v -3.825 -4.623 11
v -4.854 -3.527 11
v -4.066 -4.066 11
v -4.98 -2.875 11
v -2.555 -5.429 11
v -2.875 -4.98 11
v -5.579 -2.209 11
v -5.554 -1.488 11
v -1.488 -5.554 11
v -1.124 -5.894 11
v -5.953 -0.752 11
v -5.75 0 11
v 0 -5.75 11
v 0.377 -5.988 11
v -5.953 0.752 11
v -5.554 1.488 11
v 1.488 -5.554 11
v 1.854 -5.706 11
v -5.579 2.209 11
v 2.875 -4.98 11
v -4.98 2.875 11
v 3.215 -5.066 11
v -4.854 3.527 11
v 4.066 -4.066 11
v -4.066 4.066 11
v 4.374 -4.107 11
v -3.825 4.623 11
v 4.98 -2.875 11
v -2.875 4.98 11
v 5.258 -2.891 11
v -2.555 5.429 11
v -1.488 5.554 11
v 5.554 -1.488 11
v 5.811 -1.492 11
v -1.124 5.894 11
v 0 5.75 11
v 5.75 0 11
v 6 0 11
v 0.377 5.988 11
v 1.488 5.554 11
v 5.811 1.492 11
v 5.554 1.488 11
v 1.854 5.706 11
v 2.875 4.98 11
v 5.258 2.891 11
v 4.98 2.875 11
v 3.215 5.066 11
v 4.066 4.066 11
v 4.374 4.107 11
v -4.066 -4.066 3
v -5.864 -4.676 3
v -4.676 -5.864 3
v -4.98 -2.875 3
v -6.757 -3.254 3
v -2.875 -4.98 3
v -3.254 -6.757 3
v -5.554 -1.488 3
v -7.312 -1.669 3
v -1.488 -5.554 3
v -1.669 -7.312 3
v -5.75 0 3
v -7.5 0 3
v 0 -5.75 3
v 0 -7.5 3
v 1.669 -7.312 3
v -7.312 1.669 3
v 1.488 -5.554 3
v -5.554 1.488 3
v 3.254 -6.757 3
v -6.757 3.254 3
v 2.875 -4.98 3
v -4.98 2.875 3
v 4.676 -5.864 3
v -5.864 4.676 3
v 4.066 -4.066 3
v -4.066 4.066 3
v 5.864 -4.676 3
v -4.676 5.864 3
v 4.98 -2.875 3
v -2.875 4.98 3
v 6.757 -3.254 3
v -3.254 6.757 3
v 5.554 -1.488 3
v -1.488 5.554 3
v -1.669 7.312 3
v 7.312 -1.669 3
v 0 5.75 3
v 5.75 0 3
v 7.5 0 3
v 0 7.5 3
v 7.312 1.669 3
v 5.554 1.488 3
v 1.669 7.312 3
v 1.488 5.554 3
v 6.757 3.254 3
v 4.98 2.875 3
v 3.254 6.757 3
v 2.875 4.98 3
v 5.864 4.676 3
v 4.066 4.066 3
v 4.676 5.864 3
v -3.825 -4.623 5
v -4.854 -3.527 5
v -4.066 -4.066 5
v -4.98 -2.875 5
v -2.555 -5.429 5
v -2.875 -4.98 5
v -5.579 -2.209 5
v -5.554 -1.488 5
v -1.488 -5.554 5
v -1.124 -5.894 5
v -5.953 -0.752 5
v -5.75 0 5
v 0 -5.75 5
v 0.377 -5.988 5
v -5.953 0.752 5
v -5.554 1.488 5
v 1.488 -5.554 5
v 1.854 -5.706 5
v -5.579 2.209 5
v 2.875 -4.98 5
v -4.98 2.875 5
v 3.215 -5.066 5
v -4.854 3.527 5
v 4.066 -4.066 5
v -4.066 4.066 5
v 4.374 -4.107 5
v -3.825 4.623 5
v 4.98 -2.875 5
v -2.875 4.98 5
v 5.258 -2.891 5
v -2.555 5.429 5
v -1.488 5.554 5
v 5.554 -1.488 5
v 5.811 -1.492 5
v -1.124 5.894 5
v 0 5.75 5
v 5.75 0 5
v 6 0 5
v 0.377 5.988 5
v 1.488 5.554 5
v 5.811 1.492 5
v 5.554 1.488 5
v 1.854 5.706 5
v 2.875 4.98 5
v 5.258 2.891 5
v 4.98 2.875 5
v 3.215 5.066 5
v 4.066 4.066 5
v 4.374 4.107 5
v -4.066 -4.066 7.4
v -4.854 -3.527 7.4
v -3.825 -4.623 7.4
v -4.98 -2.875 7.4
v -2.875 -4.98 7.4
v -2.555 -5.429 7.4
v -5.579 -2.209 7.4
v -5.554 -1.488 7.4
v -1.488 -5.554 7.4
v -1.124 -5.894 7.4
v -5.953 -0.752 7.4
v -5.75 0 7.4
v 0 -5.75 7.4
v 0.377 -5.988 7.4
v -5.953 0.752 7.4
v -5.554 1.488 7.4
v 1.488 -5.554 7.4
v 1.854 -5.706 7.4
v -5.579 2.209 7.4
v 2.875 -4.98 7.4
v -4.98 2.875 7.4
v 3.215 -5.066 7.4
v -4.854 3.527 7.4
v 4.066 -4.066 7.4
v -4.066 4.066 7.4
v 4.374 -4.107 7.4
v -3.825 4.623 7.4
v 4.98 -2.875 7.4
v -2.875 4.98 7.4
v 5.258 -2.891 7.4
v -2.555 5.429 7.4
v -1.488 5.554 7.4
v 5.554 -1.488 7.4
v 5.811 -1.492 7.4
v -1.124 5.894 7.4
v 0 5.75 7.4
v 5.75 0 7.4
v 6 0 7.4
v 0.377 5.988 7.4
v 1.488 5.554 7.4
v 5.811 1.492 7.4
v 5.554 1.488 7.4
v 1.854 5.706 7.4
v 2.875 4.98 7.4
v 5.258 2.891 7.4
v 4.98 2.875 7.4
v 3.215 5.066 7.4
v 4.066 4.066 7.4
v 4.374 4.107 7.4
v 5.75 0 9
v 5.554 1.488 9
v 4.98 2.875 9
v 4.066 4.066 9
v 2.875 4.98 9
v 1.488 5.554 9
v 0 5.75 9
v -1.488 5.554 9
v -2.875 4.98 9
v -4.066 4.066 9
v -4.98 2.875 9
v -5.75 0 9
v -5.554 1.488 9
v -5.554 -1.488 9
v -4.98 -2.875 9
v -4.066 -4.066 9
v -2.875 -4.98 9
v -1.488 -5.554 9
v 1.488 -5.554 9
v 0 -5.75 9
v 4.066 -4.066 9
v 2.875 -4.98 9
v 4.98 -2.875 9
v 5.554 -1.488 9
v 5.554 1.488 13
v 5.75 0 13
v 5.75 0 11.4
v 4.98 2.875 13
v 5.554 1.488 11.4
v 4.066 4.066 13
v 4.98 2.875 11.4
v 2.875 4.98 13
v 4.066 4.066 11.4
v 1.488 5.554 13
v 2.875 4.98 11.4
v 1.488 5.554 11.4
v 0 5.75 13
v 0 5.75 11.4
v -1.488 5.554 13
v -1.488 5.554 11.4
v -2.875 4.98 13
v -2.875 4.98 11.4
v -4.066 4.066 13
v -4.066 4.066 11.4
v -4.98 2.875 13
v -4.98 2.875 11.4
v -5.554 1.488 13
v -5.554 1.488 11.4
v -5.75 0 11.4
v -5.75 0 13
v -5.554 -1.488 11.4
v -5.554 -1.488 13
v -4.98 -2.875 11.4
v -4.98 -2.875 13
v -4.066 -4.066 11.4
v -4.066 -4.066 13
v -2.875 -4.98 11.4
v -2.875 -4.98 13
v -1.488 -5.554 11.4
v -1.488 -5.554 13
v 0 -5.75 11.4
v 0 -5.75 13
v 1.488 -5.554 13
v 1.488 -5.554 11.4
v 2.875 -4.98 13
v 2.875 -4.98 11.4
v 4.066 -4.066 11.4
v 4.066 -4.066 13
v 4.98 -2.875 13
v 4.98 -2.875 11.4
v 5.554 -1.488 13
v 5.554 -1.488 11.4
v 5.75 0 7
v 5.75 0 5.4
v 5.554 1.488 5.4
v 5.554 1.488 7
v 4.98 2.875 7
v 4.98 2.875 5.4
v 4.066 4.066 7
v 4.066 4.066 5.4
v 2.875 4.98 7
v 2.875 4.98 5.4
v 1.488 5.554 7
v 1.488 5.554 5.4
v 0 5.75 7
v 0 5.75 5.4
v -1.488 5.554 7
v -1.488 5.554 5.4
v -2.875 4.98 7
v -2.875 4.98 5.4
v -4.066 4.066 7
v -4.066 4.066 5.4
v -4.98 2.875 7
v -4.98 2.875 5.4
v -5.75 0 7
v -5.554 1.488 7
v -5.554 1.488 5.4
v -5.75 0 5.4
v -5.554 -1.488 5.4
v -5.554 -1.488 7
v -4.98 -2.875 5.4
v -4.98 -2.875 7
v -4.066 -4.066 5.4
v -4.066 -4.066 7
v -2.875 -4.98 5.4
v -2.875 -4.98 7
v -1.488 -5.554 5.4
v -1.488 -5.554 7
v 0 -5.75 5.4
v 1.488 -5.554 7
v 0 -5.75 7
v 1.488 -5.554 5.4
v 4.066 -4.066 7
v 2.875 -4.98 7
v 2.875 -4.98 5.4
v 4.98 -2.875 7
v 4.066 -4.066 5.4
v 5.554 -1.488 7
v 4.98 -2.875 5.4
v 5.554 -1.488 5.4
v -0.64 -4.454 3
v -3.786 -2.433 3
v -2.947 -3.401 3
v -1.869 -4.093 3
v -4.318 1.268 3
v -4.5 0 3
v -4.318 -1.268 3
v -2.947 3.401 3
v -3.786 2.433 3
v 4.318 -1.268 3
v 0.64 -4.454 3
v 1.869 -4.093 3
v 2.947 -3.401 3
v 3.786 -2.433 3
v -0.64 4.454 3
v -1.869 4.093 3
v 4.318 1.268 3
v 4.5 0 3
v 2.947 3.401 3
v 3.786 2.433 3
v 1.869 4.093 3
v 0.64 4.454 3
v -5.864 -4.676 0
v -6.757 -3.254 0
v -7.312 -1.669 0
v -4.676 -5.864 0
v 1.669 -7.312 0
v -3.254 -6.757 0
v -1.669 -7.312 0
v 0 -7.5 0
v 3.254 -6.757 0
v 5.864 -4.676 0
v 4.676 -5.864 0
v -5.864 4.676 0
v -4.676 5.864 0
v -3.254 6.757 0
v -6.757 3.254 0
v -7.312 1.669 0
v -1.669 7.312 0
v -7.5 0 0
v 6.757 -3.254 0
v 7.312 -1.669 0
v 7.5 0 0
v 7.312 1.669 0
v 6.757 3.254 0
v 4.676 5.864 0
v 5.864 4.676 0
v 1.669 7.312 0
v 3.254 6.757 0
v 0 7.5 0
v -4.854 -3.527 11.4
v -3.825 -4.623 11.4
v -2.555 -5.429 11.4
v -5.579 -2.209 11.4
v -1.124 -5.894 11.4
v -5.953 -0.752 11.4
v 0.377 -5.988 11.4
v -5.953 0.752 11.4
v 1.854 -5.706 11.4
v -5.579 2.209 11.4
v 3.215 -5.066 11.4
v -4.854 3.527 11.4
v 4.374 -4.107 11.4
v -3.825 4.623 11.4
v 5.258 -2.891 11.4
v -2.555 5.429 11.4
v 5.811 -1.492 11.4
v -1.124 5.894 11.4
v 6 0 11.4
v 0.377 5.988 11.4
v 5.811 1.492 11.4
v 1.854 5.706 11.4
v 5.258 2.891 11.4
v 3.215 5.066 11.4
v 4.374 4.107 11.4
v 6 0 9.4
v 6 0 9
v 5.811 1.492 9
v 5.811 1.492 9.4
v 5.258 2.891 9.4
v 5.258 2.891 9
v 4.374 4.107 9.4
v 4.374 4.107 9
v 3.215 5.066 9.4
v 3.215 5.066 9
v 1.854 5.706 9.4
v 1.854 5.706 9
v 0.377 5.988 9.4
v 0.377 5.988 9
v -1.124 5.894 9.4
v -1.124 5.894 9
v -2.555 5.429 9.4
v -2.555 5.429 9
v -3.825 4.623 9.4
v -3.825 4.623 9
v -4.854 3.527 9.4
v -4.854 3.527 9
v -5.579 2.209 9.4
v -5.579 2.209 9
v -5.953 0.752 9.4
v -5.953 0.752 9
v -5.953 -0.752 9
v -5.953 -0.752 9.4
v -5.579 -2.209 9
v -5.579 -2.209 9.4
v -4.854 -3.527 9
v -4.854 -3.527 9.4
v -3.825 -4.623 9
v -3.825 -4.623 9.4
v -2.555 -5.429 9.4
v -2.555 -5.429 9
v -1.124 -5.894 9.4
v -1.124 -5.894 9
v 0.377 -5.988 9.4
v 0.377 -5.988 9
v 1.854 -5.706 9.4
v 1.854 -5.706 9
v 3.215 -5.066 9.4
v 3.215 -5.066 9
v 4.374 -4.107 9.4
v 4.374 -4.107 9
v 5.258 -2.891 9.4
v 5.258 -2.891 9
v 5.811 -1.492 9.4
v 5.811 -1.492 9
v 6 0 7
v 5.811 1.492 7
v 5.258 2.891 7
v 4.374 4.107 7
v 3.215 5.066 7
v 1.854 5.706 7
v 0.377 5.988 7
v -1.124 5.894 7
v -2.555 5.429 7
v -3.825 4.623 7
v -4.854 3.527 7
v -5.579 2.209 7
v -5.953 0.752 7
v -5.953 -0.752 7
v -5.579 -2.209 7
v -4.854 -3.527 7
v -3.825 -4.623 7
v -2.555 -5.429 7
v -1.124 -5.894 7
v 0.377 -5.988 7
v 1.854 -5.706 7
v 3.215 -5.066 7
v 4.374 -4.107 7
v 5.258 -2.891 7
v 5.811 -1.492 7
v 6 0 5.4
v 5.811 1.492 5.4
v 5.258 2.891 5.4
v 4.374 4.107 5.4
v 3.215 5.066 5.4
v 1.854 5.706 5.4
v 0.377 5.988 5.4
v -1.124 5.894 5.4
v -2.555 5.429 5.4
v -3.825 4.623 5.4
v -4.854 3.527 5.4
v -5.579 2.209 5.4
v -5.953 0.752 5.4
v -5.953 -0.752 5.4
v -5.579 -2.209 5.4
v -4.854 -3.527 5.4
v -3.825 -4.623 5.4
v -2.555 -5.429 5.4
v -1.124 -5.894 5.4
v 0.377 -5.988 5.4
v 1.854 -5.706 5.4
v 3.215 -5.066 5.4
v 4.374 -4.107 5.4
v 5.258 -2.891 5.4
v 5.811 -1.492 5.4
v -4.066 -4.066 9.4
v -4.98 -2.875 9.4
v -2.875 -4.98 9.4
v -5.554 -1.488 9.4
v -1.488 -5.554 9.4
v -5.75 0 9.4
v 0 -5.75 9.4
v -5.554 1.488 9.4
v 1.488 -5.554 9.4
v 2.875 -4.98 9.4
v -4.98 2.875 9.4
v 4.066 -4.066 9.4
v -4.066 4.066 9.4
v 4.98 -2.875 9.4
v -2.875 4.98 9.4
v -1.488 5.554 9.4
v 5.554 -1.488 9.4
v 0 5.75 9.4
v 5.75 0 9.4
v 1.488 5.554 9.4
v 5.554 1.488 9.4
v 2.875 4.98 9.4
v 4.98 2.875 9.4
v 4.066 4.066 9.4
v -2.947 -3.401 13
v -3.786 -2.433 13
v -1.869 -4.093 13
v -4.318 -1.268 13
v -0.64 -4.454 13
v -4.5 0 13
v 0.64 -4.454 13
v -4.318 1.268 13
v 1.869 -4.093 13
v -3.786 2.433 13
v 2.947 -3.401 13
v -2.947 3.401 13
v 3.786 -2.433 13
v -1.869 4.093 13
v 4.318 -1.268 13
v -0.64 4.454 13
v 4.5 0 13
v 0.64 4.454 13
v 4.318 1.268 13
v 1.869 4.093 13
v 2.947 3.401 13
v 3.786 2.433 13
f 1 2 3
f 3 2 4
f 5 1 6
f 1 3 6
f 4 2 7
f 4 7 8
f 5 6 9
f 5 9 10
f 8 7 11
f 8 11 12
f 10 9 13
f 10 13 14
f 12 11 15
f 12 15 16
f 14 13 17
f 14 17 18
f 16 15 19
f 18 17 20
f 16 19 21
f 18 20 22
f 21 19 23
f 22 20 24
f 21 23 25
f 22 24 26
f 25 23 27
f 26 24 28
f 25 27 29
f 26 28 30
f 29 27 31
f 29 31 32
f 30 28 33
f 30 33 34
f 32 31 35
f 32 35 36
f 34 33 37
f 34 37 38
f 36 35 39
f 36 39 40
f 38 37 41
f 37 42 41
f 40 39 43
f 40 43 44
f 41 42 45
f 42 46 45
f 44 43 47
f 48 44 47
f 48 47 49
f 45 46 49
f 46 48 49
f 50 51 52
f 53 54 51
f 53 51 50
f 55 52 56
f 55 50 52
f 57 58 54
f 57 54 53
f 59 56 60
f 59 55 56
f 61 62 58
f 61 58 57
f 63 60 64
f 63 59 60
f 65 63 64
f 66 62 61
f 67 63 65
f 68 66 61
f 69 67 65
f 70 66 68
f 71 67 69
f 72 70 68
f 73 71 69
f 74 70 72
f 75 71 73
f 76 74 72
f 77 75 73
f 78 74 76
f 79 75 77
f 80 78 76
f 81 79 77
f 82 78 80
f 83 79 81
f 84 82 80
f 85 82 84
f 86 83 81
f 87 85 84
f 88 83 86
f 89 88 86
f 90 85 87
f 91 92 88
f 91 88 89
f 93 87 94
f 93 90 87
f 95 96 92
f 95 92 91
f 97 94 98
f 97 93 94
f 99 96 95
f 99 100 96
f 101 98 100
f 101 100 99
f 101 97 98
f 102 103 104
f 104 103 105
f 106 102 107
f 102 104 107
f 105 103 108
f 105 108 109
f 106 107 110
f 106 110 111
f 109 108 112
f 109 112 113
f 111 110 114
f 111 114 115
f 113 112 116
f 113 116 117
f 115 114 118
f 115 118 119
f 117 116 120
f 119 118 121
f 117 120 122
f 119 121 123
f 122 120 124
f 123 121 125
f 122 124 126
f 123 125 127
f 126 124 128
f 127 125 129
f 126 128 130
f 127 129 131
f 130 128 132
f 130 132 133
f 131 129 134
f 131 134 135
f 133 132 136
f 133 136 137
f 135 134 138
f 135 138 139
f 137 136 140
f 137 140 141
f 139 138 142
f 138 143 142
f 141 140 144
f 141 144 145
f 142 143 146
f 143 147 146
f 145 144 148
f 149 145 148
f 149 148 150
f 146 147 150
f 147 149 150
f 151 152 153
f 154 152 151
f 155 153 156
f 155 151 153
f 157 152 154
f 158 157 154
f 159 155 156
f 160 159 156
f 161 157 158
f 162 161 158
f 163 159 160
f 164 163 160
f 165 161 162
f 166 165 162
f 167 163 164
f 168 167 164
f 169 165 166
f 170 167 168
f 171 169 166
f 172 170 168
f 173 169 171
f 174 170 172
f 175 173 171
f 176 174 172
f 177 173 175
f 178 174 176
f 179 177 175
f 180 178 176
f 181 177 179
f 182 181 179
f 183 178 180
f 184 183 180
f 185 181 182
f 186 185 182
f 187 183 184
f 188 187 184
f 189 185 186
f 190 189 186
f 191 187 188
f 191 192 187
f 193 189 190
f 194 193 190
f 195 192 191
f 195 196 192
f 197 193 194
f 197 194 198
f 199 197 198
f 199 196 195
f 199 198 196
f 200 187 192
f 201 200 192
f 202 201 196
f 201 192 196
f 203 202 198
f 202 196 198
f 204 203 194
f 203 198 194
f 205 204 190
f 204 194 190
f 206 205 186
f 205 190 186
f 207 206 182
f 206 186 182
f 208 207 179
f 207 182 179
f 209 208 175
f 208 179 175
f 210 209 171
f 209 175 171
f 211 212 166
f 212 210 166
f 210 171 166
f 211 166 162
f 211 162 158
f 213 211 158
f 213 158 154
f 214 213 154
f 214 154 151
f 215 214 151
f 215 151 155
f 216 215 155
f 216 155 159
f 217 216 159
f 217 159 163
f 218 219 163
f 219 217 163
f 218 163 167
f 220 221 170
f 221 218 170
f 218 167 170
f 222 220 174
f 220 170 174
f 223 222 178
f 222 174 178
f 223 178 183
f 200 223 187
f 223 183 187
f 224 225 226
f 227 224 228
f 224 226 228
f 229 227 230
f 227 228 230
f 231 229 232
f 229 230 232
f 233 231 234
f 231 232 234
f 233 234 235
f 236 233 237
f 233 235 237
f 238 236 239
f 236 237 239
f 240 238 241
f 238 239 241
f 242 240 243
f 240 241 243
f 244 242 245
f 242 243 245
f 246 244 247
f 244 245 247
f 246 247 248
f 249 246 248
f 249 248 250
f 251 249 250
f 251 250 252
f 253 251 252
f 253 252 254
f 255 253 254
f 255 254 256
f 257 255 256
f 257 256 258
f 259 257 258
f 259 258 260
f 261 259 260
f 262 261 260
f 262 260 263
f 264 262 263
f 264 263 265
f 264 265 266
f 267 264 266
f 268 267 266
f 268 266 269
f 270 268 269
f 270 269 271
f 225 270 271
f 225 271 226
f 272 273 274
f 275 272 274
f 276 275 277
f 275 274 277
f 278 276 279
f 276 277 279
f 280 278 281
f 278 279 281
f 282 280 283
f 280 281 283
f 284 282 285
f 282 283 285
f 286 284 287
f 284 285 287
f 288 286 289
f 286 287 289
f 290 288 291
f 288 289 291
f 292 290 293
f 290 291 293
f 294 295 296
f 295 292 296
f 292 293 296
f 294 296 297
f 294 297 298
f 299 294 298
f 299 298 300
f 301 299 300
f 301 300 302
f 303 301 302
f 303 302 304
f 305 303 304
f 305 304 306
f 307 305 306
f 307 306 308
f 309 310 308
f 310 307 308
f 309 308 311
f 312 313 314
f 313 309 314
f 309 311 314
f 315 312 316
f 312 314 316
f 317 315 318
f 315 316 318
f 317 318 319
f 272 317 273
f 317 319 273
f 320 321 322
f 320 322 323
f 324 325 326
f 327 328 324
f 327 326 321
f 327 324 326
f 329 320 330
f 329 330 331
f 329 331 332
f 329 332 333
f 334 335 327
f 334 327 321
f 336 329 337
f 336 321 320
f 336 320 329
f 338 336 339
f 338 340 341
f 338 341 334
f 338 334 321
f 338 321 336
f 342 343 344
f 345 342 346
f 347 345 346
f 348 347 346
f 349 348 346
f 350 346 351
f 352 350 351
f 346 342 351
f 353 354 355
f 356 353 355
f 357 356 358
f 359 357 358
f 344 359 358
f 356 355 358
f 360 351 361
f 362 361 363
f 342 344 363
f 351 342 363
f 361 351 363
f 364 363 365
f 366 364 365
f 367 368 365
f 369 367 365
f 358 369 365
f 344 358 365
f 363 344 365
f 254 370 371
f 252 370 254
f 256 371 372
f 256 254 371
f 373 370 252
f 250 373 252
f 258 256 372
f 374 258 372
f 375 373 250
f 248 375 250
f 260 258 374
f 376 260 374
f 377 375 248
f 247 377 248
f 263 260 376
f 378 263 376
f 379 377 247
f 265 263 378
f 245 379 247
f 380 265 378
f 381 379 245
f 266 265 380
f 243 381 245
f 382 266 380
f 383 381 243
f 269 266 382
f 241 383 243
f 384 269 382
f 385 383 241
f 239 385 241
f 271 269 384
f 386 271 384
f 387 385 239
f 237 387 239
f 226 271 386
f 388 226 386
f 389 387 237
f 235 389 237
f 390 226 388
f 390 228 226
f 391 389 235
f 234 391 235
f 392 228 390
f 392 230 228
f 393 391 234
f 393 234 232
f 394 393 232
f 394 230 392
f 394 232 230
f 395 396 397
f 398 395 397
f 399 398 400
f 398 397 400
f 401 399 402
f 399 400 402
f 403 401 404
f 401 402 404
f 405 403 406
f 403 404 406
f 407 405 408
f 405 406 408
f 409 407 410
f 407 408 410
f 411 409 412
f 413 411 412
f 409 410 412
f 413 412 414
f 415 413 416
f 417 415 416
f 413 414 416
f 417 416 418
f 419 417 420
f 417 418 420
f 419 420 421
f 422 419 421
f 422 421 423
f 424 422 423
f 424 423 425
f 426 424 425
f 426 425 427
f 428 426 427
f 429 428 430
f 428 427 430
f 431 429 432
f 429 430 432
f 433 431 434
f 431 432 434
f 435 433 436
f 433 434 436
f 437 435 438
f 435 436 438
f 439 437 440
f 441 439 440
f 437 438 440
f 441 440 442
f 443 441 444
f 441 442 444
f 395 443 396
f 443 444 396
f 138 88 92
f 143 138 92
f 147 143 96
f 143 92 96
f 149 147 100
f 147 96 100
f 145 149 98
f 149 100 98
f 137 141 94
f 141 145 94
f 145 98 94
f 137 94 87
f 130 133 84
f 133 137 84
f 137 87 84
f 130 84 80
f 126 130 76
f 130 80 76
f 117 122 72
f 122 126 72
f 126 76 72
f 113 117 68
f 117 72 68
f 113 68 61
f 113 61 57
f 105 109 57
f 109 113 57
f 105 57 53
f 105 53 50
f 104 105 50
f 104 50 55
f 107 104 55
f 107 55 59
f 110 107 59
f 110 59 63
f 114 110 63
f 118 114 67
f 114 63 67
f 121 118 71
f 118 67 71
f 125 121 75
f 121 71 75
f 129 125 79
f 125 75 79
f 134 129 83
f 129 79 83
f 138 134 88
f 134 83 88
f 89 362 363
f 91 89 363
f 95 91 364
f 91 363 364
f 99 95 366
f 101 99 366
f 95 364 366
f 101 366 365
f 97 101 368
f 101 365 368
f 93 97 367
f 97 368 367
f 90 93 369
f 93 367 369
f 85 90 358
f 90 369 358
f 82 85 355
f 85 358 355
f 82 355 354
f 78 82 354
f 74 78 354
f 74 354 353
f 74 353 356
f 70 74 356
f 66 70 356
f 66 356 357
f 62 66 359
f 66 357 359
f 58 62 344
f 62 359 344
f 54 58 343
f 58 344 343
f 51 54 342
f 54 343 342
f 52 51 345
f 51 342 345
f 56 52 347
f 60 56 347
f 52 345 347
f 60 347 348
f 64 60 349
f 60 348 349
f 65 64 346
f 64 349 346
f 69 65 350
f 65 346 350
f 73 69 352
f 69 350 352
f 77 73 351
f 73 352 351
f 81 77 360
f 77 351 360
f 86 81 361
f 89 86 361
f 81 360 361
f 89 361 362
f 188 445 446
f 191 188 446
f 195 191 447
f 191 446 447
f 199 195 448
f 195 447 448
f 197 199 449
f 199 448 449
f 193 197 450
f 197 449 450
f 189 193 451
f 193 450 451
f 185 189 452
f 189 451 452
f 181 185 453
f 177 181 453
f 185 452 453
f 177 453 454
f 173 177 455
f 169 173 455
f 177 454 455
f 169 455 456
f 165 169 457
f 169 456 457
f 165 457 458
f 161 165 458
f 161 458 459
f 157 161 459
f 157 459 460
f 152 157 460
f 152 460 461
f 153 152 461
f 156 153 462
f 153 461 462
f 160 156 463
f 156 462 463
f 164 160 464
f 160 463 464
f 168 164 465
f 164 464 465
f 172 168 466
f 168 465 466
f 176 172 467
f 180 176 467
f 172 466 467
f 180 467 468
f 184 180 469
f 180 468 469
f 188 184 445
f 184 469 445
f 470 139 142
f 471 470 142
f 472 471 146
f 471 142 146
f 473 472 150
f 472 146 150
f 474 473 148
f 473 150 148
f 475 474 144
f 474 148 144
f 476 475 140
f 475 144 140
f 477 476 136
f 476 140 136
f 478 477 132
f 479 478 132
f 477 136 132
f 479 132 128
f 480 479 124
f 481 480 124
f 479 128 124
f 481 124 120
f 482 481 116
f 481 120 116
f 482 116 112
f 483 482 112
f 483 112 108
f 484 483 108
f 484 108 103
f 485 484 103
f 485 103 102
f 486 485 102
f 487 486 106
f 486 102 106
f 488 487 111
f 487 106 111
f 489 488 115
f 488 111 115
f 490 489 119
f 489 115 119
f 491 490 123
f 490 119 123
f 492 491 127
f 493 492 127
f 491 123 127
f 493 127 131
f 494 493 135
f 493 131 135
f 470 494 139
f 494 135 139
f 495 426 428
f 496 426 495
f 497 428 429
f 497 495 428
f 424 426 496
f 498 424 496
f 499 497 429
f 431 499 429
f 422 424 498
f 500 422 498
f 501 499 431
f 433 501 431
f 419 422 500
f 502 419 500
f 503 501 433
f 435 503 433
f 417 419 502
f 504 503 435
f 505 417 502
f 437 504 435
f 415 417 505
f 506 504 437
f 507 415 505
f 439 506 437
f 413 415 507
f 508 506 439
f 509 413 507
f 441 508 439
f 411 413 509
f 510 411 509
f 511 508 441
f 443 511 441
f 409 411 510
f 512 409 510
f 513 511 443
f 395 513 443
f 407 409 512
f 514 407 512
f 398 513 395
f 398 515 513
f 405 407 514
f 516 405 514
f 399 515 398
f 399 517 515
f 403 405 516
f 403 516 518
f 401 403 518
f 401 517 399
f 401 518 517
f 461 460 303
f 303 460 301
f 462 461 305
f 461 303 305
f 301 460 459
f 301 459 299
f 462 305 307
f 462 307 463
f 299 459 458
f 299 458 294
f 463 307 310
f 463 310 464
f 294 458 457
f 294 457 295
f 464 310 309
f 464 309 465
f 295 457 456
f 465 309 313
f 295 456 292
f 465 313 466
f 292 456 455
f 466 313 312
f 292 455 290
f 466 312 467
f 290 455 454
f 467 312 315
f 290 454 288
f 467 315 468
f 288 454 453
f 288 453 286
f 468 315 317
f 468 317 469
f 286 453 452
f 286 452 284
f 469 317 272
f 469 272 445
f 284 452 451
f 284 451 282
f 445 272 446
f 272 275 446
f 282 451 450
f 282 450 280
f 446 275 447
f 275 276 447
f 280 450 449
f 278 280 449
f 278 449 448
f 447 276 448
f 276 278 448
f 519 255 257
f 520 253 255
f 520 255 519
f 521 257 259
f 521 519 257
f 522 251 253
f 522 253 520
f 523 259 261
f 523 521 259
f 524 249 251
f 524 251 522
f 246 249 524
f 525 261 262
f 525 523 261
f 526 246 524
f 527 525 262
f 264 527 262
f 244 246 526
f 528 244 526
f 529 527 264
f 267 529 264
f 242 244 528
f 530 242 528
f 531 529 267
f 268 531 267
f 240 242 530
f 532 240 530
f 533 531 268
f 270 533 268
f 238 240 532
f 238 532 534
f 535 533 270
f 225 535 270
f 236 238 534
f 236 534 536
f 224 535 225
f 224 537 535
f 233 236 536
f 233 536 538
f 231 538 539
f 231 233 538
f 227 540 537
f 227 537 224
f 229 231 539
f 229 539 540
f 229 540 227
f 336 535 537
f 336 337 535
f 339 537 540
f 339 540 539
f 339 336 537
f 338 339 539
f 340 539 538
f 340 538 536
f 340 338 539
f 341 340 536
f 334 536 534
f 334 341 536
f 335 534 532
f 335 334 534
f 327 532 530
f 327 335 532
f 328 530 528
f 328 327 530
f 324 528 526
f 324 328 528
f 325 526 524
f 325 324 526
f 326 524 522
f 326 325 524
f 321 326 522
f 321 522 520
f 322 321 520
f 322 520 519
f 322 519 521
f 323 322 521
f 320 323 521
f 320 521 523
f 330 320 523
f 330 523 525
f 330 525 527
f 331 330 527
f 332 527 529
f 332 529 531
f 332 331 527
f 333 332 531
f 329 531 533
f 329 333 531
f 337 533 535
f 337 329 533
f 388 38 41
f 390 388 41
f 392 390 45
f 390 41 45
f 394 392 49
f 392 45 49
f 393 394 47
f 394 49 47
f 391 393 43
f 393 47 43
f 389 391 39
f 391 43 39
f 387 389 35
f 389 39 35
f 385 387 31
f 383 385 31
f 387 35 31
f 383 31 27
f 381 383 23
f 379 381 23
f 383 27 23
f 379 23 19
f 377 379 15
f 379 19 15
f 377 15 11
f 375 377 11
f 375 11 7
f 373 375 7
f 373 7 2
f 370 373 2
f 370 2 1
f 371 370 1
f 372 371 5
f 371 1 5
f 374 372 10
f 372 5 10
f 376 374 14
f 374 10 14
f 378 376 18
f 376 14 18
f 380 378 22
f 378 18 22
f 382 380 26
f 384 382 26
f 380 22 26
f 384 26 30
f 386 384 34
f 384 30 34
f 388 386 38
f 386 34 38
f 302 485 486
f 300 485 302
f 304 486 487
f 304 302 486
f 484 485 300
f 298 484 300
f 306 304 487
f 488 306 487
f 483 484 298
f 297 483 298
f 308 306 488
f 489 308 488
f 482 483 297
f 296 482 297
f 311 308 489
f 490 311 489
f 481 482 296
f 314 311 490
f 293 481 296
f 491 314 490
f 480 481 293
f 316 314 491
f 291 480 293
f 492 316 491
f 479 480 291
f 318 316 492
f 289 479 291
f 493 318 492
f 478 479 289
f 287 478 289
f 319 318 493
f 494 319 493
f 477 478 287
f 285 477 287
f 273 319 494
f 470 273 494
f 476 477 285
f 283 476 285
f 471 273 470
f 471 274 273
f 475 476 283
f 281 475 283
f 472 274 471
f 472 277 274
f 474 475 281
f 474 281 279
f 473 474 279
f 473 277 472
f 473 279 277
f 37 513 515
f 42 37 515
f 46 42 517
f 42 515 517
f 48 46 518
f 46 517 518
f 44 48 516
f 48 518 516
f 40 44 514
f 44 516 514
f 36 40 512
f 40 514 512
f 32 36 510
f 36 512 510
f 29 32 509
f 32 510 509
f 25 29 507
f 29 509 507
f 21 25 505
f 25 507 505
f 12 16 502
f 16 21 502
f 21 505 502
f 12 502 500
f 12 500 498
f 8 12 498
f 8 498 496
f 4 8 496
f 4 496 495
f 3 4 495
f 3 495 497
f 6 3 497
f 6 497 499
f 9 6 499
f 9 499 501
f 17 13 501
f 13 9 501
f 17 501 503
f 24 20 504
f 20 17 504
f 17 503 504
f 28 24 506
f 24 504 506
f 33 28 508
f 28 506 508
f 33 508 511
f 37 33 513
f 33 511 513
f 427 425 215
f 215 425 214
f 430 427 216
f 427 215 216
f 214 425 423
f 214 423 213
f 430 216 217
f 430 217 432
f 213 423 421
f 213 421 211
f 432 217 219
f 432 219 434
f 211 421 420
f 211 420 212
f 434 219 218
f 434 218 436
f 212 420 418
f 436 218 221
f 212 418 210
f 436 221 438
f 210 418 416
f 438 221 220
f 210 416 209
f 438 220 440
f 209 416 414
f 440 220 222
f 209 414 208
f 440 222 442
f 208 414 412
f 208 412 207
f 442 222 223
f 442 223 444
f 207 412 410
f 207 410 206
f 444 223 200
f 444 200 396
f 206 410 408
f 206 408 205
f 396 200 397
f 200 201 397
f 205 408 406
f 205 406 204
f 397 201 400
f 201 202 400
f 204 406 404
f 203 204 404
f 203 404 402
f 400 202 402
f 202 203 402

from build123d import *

# Parameters (mm, degrees)
F0_R      = 7.5
F1_DEPTH  = 3
F2_R      = 5.75
F2_R_2    = 4.5
F3_DEPTH  = 10
F5_R      = 6
F5_R_2    = 4.5
F6_DEPTH  = 0.4
F8_R      = 6
F8_R_2    = 4.5
F9_DEPTH  = 0.4
F11_R     = 6
F11_R_2   = 4.5
F12_DEPTH = 0.4
F14_R     = 6
F14_R_2   = 4.5
F15_DEPTH = 0.4


with BuildPart() as f1:
    # F0 (on Top) → F1 (new body)
    with BuildSketch(Plane.XY):
        Circle(F0_R)
    extrude(amount=F1_DEPTH)

    # F2 (on face) → F3 (join)
    with BuildSketch(Plane.XY.offset(3)):
        Circle(F2_R)
        Circle(F2_R_2, mode=Mode.SUBTRACT)
    extrude(amount=F3_DEPTH)

    # F5 (on offset) → F6 (join)
    with BuildSketch(Plane.XY.offset(5)):
        Circle(F5_R)
        Circle(F5_R_2, mode=Mode.SUBTRACT)
    extrude(amount=F6_DEPTH)

    # F8 (on offset) → F9 (join)
    with BuildSketch(Plane.XY.offset(7)):
        Circle(F8_R)
        Circle(F8_R_2, mode=Mode.SUBTRACT)
    extrude(amount=F9_DEPTH)

    # F11 (on offset) → F12 (join)
    with BuildSketch(Plane.XY.offset(9)):
        Circle(F11_R)
        Circle(F11_R_2, mode=Mode.SUBTRACT)
    extrude(amount=F12_DEPTH)

    # F14 (on offset) → F15 (join)
    with BuildSketch(Plane.XY.offset(11)):
        Circle(F14_R)
        Circle(F14_R_2, mode=Mode.SUBTRACT)
    extrude(amount=F15_DEPTH)


solid = f1.part
